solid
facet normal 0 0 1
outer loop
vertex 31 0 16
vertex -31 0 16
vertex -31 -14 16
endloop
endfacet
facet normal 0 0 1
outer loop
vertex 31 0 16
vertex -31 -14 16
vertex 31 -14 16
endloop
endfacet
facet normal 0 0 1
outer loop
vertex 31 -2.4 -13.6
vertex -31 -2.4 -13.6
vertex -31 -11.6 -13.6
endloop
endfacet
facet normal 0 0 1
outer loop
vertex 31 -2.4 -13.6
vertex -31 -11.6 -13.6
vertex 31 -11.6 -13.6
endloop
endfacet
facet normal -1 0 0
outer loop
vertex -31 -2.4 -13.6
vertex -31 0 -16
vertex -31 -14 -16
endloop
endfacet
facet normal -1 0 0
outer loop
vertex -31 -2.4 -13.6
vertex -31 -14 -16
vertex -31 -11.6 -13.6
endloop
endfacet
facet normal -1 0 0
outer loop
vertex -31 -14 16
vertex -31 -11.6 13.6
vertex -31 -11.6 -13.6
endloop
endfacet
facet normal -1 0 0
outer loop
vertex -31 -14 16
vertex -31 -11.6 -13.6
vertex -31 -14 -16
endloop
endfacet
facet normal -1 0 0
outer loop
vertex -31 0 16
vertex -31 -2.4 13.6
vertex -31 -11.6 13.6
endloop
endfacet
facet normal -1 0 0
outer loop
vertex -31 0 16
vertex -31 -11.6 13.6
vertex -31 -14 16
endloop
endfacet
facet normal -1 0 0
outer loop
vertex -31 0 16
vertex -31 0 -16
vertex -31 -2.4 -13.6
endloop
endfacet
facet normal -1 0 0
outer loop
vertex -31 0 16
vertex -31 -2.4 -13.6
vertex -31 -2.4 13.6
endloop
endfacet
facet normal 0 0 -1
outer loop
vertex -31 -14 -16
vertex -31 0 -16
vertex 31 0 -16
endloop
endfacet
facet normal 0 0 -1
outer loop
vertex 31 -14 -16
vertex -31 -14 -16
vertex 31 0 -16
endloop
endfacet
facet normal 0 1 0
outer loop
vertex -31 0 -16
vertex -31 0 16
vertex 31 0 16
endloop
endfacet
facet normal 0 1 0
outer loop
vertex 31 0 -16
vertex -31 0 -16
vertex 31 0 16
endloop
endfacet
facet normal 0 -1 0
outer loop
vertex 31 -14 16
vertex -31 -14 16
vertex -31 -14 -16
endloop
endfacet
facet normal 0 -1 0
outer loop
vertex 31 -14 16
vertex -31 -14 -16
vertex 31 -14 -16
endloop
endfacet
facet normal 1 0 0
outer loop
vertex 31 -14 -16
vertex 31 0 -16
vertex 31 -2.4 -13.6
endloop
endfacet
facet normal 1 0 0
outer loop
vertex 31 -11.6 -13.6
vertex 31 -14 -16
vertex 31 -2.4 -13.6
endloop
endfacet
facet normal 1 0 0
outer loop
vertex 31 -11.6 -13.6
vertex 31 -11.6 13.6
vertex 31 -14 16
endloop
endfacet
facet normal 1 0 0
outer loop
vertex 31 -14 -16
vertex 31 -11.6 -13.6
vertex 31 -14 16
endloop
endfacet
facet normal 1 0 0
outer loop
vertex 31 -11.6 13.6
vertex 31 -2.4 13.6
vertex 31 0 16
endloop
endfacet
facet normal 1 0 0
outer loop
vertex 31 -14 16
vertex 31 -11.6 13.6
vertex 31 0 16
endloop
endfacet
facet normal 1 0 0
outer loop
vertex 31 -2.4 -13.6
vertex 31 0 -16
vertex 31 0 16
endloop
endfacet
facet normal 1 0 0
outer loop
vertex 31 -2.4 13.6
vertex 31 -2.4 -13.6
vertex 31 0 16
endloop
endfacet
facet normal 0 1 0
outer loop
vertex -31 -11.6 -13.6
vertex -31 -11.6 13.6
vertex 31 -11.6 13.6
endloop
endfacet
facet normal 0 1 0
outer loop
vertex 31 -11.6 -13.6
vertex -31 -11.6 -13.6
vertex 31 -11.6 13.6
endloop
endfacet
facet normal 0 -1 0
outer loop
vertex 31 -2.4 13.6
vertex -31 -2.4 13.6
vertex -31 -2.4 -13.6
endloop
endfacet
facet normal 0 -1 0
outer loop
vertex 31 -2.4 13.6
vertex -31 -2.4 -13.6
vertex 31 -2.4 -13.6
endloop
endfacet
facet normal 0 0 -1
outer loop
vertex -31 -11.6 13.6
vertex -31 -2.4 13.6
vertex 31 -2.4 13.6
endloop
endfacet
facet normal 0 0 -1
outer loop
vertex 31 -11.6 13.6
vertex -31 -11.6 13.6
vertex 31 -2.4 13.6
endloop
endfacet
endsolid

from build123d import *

# Parameters (mm, degrees)
F0_W     = 62
F0_H     = 32
F1_DEPTH = 14
F2_T     = -2.4


with BuildPart() as f1:
    # F0 (on Front) → F1 (new body)
    with BuildSketch(Plane.XZ):
        Rectangle(F0_W, F0_H)
    extrude(amount=F1_DEPTH)

    # F2
    f2_openings = [f1.faces().sort_by_distance(p)[0] for p in [
        (31, -7, 0),
        (-31, -7, 0),
    ]]
    offset(amount=F2_T, openings=f2_openings)


solid = f1.part
